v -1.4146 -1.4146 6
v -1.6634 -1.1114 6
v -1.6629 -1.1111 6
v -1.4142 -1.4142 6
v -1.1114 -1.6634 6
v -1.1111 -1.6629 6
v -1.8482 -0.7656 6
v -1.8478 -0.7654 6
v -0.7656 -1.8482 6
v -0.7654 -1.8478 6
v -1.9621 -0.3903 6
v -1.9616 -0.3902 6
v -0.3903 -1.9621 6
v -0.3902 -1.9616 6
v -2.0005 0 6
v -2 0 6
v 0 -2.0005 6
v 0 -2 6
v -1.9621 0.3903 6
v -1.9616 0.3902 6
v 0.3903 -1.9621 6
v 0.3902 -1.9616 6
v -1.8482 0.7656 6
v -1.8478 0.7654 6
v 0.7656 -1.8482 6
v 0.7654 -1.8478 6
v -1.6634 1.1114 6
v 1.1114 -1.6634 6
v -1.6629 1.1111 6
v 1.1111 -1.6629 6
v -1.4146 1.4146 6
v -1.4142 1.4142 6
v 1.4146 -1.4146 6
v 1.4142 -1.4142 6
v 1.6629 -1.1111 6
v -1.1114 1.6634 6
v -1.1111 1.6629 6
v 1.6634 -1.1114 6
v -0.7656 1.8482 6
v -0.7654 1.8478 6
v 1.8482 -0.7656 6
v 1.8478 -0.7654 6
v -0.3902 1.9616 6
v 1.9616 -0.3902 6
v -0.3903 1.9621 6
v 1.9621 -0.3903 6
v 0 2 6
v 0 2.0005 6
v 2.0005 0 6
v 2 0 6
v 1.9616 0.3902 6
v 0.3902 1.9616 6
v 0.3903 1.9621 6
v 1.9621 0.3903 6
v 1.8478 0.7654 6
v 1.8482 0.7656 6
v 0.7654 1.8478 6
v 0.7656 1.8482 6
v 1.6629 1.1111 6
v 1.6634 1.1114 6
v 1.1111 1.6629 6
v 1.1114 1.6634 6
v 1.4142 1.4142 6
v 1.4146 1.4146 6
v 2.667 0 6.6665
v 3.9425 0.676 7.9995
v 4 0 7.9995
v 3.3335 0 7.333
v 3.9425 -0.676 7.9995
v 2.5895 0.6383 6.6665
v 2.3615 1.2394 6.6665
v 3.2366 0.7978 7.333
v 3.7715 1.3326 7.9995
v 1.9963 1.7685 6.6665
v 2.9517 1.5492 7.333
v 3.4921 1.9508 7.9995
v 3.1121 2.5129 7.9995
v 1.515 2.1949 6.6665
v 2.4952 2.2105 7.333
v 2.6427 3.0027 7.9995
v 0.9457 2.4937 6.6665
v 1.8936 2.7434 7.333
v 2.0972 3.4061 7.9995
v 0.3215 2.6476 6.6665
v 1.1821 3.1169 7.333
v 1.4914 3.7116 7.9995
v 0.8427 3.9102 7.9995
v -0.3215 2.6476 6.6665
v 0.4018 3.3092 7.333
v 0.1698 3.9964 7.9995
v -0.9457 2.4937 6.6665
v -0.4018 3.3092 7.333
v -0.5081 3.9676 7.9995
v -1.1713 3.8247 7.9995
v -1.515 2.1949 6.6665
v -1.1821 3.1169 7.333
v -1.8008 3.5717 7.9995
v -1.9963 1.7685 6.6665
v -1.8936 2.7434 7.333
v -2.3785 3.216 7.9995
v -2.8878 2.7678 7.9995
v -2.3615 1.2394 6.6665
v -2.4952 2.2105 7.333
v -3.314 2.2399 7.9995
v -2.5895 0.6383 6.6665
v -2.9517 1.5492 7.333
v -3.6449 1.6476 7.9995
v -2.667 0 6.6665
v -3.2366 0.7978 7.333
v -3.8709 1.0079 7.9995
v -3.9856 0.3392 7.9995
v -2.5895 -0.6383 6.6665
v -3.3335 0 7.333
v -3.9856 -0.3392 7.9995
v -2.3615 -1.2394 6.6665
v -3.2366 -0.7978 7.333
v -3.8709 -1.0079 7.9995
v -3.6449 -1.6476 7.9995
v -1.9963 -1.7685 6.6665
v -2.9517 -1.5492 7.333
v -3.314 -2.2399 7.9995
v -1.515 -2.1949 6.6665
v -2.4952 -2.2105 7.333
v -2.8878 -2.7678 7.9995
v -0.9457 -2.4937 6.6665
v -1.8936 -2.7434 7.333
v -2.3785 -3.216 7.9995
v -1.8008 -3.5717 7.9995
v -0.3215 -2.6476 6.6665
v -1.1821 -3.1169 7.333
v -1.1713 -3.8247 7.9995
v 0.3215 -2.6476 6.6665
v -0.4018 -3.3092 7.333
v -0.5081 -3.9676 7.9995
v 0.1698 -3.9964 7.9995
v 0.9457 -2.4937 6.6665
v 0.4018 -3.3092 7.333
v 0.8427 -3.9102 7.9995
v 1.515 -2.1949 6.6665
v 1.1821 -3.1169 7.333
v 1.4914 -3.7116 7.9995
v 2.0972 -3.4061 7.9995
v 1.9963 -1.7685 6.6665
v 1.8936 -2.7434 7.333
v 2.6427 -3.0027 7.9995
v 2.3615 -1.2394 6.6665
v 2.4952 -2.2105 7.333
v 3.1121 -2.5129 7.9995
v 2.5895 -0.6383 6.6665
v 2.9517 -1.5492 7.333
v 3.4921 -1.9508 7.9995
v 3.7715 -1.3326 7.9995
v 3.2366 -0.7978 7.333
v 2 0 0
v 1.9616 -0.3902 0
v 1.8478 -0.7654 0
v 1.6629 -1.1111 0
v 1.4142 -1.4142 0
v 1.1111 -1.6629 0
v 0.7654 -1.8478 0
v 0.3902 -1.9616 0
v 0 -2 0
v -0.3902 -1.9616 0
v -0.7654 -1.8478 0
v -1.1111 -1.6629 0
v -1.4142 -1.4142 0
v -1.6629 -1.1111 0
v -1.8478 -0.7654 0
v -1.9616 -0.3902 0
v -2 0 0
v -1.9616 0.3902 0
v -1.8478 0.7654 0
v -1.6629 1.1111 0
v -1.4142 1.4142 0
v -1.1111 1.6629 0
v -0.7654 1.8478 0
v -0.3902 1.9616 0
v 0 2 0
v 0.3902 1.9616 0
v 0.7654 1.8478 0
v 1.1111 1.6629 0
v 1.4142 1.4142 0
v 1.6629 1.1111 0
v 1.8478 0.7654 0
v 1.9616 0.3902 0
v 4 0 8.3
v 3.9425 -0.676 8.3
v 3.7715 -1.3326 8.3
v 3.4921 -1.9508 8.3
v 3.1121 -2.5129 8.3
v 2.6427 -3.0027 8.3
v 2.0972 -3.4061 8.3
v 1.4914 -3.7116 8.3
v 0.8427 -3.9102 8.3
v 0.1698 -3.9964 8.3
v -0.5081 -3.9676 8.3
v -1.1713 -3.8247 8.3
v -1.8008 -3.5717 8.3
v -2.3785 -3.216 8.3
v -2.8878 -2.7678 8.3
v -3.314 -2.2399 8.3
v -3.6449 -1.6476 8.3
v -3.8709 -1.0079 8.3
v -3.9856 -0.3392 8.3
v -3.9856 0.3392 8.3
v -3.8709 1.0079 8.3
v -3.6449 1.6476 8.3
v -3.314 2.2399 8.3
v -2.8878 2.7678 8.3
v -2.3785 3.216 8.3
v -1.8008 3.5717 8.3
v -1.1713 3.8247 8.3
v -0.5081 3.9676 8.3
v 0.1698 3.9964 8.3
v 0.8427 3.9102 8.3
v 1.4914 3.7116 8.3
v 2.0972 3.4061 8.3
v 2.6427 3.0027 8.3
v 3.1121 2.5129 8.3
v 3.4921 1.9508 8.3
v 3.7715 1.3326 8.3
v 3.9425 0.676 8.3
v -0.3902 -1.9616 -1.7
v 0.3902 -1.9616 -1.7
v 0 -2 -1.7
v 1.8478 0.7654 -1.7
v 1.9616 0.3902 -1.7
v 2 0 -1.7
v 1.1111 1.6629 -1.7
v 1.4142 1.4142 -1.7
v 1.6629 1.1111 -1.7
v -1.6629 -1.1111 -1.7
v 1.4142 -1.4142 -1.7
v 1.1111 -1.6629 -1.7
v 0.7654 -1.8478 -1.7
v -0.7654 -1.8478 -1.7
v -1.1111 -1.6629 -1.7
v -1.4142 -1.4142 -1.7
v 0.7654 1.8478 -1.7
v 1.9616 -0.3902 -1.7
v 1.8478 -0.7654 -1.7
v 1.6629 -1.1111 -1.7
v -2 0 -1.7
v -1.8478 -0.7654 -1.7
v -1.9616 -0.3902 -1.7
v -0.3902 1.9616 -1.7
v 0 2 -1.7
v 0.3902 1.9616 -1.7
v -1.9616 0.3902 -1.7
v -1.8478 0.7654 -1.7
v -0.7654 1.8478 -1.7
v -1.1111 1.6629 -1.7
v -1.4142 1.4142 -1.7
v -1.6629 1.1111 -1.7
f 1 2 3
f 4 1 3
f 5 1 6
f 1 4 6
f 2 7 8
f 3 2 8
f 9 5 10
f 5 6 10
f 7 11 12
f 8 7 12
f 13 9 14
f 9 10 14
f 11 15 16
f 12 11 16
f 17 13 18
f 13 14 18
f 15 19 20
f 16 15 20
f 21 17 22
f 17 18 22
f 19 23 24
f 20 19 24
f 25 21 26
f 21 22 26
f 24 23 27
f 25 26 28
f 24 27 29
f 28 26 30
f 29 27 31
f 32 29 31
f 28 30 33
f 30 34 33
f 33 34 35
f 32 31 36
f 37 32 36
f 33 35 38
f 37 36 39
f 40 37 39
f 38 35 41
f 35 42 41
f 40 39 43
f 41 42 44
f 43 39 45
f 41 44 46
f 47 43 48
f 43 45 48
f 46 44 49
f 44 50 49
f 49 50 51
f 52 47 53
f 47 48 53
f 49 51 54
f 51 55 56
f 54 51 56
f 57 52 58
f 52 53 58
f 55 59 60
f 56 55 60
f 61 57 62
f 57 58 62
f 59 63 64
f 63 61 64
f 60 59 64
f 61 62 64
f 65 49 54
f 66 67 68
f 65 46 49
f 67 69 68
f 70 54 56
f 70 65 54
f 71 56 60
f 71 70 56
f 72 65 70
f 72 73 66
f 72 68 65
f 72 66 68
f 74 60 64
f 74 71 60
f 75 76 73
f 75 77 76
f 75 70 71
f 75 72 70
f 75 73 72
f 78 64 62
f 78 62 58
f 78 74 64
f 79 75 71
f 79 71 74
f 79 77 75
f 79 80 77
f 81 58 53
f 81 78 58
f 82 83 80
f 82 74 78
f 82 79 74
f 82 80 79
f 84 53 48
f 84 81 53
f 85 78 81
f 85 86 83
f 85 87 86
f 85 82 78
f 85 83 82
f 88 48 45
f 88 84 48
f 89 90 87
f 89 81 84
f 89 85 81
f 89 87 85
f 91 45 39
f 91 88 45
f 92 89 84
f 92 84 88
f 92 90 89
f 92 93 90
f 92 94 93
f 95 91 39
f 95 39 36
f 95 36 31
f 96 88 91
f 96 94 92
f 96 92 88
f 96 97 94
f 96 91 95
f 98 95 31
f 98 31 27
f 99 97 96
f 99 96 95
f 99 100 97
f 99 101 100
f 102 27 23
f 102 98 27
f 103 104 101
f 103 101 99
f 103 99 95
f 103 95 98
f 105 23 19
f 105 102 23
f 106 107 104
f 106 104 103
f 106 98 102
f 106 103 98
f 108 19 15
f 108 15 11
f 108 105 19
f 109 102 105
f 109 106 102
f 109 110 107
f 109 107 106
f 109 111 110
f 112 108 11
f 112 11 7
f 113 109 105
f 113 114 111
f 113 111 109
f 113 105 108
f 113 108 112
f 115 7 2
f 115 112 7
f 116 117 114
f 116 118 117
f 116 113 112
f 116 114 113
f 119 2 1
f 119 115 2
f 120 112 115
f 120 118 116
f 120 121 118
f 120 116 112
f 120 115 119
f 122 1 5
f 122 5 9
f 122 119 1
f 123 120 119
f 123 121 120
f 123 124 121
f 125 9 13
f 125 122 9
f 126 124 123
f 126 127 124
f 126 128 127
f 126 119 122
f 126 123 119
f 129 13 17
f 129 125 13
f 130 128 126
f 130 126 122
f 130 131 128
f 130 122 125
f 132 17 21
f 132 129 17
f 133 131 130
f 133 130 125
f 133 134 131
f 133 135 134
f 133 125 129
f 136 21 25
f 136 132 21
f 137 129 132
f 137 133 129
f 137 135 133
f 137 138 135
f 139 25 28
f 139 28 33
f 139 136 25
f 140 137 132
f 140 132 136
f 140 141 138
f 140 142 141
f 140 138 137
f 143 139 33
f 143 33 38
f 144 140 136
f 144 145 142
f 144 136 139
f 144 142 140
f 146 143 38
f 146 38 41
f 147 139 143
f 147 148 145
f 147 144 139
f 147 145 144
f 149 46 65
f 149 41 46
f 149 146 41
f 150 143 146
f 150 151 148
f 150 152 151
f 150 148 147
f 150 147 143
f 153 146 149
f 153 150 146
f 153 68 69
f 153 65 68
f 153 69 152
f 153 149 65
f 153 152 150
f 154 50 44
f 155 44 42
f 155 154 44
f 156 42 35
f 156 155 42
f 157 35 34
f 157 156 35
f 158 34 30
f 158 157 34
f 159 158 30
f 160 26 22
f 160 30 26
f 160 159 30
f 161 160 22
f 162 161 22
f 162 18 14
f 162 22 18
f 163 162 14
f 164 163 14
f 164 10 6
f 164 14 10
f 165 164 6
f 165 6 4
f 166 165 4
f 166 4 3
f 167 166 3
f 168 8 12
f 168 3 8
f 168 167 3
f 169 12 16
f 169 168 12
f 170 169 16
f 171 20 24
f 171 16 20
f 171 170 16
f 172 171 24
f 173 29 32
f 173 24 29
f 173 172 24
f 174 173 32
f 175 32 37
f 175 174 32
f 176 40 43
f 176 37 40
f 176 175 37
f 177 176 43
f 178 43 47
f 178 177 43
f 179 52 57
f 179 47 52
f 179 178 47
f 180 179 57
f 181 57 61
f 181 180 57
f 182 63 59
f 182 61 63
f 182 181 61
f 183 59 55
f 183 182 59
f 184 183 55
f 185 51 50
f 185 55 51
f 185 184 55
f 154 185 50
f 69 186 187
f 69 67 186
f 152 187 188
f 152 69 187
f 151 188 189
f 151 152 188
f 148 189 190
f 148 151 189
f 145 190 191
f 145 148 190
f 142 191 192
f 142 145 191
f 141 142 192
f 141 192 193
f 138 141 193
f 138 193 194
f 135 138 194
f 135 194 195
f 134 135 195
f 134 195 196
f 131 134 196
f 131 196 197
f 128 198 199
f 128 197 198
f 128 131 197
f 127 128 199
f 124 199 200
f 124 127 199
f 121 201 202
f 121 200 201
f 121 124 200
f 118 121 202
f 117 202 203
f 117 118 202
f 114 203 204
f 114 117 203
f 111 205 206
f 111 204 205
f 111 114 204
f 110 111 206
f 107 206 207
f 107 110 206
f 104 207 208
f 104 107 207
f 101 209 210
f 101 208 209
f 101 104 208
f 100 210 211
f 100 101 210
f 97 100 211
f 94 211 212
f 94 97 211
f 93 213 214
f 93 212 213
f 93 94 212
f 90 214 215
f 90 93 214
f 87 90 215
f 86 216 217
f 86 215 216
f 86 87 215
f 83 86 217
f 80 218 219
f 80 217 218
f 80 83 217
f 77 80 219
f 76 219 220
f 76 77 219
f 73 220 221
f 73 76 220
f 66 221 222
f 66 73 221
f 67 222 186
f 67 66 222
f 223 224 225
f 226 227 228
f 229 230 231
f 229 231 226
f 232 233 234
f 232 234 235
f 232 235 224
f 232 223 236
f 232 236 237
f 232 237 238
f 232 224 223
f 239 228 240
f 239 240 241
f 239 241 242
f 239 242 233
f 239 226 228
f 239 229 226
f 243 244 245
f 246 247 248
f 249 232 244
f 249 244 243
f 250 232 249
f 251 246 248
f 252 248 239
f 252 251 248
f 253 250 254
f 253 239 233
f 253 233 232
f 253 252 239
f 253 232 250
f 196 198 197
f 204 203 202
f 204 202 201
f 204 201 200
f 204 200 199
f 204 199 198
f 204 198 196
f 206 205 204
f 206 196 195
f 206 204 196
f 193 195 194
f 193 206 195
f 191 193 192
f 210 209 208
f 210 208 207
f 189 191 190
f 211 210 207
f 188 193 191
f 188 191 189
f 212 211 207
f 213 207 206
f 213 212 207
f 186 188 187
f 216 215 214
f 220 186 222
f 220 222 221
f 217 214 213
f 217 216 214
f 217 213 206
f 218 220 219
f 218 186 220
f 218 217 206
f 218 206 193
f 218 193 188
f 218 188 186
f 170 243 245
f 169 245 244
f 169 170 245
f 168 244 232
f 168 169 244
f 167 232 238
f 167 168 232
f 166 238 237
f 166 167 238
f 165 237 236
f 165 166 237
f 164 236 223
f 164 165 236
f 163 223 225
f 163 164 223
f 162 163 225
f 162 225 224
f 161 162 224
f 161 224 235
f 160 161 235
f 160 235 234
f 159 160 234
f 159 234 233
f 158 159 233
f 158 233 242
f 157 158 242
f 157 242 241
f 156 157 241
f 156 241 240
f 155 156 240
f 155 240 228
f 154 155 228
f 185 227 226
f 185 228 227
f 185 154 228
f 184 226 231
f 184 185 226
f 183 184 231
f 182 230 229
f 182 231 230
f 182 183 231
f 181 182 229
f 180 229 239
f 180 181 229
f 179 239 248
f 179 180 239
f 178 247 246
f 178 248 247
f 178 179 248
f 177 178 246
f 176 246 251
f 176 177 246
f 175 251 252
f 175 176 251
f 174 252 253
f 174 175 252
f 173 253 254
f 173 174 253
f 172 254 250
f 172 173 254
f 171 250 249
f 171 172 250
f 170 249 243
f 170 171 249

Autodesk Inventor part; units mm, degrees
ref_plane "YZ Plane" through (0, 0, 0) normal (1, 0, 0) x (0, 1, 0)
ref_plane "XZ Plane" through (0, 0, 0) normal (0, 1, 0) x (-1, 0, 0)
ref_plane "XY Plane" through (0, 0, 0) normal (0, 0, 1) x (1, 0, 0)
sketch "スケッチ1" plane through (0, 0, 0) normal (0, 0, 1) x (1, 0, 0)
  circle A0 centre (0, 0) radius 2
  dimension "d0" = 4
extrude "押し出し1" add sketch "スケッチ1" along normal blind 6
sketch "スケッチ2" plane through (0, 0, 6) normal (0, 0, 1) x (1, 0, 0)
  circle A0 centre (0, 0) radius 2 projected
  circle A1 centre (0, 0) radius 4
  dimension "d3" = 8
extrude "押し出し2" add sketch "スケッチ2" along normal blind 2.3 contours A0 | A1
thread "ねじ1" size "M4x0.7" class "6g" standard "ANSI Metric M Profile" full length
chamfer "面取り1" distance 2 angle 45 1 edges at (-4, 0, 6)
sketch "スケッチ4" plane through (0, 0, 0) normal (0, 0, -1) x (-1, 0, 0)
  circle A0 centre (0, 0) radius 2
extrude "押し出し4" add sketch "スケッチ4" along normal blind 1.7
properties part number "SB　M4 10mm 皿ネジ" material "Stainless Steel, 440C"
